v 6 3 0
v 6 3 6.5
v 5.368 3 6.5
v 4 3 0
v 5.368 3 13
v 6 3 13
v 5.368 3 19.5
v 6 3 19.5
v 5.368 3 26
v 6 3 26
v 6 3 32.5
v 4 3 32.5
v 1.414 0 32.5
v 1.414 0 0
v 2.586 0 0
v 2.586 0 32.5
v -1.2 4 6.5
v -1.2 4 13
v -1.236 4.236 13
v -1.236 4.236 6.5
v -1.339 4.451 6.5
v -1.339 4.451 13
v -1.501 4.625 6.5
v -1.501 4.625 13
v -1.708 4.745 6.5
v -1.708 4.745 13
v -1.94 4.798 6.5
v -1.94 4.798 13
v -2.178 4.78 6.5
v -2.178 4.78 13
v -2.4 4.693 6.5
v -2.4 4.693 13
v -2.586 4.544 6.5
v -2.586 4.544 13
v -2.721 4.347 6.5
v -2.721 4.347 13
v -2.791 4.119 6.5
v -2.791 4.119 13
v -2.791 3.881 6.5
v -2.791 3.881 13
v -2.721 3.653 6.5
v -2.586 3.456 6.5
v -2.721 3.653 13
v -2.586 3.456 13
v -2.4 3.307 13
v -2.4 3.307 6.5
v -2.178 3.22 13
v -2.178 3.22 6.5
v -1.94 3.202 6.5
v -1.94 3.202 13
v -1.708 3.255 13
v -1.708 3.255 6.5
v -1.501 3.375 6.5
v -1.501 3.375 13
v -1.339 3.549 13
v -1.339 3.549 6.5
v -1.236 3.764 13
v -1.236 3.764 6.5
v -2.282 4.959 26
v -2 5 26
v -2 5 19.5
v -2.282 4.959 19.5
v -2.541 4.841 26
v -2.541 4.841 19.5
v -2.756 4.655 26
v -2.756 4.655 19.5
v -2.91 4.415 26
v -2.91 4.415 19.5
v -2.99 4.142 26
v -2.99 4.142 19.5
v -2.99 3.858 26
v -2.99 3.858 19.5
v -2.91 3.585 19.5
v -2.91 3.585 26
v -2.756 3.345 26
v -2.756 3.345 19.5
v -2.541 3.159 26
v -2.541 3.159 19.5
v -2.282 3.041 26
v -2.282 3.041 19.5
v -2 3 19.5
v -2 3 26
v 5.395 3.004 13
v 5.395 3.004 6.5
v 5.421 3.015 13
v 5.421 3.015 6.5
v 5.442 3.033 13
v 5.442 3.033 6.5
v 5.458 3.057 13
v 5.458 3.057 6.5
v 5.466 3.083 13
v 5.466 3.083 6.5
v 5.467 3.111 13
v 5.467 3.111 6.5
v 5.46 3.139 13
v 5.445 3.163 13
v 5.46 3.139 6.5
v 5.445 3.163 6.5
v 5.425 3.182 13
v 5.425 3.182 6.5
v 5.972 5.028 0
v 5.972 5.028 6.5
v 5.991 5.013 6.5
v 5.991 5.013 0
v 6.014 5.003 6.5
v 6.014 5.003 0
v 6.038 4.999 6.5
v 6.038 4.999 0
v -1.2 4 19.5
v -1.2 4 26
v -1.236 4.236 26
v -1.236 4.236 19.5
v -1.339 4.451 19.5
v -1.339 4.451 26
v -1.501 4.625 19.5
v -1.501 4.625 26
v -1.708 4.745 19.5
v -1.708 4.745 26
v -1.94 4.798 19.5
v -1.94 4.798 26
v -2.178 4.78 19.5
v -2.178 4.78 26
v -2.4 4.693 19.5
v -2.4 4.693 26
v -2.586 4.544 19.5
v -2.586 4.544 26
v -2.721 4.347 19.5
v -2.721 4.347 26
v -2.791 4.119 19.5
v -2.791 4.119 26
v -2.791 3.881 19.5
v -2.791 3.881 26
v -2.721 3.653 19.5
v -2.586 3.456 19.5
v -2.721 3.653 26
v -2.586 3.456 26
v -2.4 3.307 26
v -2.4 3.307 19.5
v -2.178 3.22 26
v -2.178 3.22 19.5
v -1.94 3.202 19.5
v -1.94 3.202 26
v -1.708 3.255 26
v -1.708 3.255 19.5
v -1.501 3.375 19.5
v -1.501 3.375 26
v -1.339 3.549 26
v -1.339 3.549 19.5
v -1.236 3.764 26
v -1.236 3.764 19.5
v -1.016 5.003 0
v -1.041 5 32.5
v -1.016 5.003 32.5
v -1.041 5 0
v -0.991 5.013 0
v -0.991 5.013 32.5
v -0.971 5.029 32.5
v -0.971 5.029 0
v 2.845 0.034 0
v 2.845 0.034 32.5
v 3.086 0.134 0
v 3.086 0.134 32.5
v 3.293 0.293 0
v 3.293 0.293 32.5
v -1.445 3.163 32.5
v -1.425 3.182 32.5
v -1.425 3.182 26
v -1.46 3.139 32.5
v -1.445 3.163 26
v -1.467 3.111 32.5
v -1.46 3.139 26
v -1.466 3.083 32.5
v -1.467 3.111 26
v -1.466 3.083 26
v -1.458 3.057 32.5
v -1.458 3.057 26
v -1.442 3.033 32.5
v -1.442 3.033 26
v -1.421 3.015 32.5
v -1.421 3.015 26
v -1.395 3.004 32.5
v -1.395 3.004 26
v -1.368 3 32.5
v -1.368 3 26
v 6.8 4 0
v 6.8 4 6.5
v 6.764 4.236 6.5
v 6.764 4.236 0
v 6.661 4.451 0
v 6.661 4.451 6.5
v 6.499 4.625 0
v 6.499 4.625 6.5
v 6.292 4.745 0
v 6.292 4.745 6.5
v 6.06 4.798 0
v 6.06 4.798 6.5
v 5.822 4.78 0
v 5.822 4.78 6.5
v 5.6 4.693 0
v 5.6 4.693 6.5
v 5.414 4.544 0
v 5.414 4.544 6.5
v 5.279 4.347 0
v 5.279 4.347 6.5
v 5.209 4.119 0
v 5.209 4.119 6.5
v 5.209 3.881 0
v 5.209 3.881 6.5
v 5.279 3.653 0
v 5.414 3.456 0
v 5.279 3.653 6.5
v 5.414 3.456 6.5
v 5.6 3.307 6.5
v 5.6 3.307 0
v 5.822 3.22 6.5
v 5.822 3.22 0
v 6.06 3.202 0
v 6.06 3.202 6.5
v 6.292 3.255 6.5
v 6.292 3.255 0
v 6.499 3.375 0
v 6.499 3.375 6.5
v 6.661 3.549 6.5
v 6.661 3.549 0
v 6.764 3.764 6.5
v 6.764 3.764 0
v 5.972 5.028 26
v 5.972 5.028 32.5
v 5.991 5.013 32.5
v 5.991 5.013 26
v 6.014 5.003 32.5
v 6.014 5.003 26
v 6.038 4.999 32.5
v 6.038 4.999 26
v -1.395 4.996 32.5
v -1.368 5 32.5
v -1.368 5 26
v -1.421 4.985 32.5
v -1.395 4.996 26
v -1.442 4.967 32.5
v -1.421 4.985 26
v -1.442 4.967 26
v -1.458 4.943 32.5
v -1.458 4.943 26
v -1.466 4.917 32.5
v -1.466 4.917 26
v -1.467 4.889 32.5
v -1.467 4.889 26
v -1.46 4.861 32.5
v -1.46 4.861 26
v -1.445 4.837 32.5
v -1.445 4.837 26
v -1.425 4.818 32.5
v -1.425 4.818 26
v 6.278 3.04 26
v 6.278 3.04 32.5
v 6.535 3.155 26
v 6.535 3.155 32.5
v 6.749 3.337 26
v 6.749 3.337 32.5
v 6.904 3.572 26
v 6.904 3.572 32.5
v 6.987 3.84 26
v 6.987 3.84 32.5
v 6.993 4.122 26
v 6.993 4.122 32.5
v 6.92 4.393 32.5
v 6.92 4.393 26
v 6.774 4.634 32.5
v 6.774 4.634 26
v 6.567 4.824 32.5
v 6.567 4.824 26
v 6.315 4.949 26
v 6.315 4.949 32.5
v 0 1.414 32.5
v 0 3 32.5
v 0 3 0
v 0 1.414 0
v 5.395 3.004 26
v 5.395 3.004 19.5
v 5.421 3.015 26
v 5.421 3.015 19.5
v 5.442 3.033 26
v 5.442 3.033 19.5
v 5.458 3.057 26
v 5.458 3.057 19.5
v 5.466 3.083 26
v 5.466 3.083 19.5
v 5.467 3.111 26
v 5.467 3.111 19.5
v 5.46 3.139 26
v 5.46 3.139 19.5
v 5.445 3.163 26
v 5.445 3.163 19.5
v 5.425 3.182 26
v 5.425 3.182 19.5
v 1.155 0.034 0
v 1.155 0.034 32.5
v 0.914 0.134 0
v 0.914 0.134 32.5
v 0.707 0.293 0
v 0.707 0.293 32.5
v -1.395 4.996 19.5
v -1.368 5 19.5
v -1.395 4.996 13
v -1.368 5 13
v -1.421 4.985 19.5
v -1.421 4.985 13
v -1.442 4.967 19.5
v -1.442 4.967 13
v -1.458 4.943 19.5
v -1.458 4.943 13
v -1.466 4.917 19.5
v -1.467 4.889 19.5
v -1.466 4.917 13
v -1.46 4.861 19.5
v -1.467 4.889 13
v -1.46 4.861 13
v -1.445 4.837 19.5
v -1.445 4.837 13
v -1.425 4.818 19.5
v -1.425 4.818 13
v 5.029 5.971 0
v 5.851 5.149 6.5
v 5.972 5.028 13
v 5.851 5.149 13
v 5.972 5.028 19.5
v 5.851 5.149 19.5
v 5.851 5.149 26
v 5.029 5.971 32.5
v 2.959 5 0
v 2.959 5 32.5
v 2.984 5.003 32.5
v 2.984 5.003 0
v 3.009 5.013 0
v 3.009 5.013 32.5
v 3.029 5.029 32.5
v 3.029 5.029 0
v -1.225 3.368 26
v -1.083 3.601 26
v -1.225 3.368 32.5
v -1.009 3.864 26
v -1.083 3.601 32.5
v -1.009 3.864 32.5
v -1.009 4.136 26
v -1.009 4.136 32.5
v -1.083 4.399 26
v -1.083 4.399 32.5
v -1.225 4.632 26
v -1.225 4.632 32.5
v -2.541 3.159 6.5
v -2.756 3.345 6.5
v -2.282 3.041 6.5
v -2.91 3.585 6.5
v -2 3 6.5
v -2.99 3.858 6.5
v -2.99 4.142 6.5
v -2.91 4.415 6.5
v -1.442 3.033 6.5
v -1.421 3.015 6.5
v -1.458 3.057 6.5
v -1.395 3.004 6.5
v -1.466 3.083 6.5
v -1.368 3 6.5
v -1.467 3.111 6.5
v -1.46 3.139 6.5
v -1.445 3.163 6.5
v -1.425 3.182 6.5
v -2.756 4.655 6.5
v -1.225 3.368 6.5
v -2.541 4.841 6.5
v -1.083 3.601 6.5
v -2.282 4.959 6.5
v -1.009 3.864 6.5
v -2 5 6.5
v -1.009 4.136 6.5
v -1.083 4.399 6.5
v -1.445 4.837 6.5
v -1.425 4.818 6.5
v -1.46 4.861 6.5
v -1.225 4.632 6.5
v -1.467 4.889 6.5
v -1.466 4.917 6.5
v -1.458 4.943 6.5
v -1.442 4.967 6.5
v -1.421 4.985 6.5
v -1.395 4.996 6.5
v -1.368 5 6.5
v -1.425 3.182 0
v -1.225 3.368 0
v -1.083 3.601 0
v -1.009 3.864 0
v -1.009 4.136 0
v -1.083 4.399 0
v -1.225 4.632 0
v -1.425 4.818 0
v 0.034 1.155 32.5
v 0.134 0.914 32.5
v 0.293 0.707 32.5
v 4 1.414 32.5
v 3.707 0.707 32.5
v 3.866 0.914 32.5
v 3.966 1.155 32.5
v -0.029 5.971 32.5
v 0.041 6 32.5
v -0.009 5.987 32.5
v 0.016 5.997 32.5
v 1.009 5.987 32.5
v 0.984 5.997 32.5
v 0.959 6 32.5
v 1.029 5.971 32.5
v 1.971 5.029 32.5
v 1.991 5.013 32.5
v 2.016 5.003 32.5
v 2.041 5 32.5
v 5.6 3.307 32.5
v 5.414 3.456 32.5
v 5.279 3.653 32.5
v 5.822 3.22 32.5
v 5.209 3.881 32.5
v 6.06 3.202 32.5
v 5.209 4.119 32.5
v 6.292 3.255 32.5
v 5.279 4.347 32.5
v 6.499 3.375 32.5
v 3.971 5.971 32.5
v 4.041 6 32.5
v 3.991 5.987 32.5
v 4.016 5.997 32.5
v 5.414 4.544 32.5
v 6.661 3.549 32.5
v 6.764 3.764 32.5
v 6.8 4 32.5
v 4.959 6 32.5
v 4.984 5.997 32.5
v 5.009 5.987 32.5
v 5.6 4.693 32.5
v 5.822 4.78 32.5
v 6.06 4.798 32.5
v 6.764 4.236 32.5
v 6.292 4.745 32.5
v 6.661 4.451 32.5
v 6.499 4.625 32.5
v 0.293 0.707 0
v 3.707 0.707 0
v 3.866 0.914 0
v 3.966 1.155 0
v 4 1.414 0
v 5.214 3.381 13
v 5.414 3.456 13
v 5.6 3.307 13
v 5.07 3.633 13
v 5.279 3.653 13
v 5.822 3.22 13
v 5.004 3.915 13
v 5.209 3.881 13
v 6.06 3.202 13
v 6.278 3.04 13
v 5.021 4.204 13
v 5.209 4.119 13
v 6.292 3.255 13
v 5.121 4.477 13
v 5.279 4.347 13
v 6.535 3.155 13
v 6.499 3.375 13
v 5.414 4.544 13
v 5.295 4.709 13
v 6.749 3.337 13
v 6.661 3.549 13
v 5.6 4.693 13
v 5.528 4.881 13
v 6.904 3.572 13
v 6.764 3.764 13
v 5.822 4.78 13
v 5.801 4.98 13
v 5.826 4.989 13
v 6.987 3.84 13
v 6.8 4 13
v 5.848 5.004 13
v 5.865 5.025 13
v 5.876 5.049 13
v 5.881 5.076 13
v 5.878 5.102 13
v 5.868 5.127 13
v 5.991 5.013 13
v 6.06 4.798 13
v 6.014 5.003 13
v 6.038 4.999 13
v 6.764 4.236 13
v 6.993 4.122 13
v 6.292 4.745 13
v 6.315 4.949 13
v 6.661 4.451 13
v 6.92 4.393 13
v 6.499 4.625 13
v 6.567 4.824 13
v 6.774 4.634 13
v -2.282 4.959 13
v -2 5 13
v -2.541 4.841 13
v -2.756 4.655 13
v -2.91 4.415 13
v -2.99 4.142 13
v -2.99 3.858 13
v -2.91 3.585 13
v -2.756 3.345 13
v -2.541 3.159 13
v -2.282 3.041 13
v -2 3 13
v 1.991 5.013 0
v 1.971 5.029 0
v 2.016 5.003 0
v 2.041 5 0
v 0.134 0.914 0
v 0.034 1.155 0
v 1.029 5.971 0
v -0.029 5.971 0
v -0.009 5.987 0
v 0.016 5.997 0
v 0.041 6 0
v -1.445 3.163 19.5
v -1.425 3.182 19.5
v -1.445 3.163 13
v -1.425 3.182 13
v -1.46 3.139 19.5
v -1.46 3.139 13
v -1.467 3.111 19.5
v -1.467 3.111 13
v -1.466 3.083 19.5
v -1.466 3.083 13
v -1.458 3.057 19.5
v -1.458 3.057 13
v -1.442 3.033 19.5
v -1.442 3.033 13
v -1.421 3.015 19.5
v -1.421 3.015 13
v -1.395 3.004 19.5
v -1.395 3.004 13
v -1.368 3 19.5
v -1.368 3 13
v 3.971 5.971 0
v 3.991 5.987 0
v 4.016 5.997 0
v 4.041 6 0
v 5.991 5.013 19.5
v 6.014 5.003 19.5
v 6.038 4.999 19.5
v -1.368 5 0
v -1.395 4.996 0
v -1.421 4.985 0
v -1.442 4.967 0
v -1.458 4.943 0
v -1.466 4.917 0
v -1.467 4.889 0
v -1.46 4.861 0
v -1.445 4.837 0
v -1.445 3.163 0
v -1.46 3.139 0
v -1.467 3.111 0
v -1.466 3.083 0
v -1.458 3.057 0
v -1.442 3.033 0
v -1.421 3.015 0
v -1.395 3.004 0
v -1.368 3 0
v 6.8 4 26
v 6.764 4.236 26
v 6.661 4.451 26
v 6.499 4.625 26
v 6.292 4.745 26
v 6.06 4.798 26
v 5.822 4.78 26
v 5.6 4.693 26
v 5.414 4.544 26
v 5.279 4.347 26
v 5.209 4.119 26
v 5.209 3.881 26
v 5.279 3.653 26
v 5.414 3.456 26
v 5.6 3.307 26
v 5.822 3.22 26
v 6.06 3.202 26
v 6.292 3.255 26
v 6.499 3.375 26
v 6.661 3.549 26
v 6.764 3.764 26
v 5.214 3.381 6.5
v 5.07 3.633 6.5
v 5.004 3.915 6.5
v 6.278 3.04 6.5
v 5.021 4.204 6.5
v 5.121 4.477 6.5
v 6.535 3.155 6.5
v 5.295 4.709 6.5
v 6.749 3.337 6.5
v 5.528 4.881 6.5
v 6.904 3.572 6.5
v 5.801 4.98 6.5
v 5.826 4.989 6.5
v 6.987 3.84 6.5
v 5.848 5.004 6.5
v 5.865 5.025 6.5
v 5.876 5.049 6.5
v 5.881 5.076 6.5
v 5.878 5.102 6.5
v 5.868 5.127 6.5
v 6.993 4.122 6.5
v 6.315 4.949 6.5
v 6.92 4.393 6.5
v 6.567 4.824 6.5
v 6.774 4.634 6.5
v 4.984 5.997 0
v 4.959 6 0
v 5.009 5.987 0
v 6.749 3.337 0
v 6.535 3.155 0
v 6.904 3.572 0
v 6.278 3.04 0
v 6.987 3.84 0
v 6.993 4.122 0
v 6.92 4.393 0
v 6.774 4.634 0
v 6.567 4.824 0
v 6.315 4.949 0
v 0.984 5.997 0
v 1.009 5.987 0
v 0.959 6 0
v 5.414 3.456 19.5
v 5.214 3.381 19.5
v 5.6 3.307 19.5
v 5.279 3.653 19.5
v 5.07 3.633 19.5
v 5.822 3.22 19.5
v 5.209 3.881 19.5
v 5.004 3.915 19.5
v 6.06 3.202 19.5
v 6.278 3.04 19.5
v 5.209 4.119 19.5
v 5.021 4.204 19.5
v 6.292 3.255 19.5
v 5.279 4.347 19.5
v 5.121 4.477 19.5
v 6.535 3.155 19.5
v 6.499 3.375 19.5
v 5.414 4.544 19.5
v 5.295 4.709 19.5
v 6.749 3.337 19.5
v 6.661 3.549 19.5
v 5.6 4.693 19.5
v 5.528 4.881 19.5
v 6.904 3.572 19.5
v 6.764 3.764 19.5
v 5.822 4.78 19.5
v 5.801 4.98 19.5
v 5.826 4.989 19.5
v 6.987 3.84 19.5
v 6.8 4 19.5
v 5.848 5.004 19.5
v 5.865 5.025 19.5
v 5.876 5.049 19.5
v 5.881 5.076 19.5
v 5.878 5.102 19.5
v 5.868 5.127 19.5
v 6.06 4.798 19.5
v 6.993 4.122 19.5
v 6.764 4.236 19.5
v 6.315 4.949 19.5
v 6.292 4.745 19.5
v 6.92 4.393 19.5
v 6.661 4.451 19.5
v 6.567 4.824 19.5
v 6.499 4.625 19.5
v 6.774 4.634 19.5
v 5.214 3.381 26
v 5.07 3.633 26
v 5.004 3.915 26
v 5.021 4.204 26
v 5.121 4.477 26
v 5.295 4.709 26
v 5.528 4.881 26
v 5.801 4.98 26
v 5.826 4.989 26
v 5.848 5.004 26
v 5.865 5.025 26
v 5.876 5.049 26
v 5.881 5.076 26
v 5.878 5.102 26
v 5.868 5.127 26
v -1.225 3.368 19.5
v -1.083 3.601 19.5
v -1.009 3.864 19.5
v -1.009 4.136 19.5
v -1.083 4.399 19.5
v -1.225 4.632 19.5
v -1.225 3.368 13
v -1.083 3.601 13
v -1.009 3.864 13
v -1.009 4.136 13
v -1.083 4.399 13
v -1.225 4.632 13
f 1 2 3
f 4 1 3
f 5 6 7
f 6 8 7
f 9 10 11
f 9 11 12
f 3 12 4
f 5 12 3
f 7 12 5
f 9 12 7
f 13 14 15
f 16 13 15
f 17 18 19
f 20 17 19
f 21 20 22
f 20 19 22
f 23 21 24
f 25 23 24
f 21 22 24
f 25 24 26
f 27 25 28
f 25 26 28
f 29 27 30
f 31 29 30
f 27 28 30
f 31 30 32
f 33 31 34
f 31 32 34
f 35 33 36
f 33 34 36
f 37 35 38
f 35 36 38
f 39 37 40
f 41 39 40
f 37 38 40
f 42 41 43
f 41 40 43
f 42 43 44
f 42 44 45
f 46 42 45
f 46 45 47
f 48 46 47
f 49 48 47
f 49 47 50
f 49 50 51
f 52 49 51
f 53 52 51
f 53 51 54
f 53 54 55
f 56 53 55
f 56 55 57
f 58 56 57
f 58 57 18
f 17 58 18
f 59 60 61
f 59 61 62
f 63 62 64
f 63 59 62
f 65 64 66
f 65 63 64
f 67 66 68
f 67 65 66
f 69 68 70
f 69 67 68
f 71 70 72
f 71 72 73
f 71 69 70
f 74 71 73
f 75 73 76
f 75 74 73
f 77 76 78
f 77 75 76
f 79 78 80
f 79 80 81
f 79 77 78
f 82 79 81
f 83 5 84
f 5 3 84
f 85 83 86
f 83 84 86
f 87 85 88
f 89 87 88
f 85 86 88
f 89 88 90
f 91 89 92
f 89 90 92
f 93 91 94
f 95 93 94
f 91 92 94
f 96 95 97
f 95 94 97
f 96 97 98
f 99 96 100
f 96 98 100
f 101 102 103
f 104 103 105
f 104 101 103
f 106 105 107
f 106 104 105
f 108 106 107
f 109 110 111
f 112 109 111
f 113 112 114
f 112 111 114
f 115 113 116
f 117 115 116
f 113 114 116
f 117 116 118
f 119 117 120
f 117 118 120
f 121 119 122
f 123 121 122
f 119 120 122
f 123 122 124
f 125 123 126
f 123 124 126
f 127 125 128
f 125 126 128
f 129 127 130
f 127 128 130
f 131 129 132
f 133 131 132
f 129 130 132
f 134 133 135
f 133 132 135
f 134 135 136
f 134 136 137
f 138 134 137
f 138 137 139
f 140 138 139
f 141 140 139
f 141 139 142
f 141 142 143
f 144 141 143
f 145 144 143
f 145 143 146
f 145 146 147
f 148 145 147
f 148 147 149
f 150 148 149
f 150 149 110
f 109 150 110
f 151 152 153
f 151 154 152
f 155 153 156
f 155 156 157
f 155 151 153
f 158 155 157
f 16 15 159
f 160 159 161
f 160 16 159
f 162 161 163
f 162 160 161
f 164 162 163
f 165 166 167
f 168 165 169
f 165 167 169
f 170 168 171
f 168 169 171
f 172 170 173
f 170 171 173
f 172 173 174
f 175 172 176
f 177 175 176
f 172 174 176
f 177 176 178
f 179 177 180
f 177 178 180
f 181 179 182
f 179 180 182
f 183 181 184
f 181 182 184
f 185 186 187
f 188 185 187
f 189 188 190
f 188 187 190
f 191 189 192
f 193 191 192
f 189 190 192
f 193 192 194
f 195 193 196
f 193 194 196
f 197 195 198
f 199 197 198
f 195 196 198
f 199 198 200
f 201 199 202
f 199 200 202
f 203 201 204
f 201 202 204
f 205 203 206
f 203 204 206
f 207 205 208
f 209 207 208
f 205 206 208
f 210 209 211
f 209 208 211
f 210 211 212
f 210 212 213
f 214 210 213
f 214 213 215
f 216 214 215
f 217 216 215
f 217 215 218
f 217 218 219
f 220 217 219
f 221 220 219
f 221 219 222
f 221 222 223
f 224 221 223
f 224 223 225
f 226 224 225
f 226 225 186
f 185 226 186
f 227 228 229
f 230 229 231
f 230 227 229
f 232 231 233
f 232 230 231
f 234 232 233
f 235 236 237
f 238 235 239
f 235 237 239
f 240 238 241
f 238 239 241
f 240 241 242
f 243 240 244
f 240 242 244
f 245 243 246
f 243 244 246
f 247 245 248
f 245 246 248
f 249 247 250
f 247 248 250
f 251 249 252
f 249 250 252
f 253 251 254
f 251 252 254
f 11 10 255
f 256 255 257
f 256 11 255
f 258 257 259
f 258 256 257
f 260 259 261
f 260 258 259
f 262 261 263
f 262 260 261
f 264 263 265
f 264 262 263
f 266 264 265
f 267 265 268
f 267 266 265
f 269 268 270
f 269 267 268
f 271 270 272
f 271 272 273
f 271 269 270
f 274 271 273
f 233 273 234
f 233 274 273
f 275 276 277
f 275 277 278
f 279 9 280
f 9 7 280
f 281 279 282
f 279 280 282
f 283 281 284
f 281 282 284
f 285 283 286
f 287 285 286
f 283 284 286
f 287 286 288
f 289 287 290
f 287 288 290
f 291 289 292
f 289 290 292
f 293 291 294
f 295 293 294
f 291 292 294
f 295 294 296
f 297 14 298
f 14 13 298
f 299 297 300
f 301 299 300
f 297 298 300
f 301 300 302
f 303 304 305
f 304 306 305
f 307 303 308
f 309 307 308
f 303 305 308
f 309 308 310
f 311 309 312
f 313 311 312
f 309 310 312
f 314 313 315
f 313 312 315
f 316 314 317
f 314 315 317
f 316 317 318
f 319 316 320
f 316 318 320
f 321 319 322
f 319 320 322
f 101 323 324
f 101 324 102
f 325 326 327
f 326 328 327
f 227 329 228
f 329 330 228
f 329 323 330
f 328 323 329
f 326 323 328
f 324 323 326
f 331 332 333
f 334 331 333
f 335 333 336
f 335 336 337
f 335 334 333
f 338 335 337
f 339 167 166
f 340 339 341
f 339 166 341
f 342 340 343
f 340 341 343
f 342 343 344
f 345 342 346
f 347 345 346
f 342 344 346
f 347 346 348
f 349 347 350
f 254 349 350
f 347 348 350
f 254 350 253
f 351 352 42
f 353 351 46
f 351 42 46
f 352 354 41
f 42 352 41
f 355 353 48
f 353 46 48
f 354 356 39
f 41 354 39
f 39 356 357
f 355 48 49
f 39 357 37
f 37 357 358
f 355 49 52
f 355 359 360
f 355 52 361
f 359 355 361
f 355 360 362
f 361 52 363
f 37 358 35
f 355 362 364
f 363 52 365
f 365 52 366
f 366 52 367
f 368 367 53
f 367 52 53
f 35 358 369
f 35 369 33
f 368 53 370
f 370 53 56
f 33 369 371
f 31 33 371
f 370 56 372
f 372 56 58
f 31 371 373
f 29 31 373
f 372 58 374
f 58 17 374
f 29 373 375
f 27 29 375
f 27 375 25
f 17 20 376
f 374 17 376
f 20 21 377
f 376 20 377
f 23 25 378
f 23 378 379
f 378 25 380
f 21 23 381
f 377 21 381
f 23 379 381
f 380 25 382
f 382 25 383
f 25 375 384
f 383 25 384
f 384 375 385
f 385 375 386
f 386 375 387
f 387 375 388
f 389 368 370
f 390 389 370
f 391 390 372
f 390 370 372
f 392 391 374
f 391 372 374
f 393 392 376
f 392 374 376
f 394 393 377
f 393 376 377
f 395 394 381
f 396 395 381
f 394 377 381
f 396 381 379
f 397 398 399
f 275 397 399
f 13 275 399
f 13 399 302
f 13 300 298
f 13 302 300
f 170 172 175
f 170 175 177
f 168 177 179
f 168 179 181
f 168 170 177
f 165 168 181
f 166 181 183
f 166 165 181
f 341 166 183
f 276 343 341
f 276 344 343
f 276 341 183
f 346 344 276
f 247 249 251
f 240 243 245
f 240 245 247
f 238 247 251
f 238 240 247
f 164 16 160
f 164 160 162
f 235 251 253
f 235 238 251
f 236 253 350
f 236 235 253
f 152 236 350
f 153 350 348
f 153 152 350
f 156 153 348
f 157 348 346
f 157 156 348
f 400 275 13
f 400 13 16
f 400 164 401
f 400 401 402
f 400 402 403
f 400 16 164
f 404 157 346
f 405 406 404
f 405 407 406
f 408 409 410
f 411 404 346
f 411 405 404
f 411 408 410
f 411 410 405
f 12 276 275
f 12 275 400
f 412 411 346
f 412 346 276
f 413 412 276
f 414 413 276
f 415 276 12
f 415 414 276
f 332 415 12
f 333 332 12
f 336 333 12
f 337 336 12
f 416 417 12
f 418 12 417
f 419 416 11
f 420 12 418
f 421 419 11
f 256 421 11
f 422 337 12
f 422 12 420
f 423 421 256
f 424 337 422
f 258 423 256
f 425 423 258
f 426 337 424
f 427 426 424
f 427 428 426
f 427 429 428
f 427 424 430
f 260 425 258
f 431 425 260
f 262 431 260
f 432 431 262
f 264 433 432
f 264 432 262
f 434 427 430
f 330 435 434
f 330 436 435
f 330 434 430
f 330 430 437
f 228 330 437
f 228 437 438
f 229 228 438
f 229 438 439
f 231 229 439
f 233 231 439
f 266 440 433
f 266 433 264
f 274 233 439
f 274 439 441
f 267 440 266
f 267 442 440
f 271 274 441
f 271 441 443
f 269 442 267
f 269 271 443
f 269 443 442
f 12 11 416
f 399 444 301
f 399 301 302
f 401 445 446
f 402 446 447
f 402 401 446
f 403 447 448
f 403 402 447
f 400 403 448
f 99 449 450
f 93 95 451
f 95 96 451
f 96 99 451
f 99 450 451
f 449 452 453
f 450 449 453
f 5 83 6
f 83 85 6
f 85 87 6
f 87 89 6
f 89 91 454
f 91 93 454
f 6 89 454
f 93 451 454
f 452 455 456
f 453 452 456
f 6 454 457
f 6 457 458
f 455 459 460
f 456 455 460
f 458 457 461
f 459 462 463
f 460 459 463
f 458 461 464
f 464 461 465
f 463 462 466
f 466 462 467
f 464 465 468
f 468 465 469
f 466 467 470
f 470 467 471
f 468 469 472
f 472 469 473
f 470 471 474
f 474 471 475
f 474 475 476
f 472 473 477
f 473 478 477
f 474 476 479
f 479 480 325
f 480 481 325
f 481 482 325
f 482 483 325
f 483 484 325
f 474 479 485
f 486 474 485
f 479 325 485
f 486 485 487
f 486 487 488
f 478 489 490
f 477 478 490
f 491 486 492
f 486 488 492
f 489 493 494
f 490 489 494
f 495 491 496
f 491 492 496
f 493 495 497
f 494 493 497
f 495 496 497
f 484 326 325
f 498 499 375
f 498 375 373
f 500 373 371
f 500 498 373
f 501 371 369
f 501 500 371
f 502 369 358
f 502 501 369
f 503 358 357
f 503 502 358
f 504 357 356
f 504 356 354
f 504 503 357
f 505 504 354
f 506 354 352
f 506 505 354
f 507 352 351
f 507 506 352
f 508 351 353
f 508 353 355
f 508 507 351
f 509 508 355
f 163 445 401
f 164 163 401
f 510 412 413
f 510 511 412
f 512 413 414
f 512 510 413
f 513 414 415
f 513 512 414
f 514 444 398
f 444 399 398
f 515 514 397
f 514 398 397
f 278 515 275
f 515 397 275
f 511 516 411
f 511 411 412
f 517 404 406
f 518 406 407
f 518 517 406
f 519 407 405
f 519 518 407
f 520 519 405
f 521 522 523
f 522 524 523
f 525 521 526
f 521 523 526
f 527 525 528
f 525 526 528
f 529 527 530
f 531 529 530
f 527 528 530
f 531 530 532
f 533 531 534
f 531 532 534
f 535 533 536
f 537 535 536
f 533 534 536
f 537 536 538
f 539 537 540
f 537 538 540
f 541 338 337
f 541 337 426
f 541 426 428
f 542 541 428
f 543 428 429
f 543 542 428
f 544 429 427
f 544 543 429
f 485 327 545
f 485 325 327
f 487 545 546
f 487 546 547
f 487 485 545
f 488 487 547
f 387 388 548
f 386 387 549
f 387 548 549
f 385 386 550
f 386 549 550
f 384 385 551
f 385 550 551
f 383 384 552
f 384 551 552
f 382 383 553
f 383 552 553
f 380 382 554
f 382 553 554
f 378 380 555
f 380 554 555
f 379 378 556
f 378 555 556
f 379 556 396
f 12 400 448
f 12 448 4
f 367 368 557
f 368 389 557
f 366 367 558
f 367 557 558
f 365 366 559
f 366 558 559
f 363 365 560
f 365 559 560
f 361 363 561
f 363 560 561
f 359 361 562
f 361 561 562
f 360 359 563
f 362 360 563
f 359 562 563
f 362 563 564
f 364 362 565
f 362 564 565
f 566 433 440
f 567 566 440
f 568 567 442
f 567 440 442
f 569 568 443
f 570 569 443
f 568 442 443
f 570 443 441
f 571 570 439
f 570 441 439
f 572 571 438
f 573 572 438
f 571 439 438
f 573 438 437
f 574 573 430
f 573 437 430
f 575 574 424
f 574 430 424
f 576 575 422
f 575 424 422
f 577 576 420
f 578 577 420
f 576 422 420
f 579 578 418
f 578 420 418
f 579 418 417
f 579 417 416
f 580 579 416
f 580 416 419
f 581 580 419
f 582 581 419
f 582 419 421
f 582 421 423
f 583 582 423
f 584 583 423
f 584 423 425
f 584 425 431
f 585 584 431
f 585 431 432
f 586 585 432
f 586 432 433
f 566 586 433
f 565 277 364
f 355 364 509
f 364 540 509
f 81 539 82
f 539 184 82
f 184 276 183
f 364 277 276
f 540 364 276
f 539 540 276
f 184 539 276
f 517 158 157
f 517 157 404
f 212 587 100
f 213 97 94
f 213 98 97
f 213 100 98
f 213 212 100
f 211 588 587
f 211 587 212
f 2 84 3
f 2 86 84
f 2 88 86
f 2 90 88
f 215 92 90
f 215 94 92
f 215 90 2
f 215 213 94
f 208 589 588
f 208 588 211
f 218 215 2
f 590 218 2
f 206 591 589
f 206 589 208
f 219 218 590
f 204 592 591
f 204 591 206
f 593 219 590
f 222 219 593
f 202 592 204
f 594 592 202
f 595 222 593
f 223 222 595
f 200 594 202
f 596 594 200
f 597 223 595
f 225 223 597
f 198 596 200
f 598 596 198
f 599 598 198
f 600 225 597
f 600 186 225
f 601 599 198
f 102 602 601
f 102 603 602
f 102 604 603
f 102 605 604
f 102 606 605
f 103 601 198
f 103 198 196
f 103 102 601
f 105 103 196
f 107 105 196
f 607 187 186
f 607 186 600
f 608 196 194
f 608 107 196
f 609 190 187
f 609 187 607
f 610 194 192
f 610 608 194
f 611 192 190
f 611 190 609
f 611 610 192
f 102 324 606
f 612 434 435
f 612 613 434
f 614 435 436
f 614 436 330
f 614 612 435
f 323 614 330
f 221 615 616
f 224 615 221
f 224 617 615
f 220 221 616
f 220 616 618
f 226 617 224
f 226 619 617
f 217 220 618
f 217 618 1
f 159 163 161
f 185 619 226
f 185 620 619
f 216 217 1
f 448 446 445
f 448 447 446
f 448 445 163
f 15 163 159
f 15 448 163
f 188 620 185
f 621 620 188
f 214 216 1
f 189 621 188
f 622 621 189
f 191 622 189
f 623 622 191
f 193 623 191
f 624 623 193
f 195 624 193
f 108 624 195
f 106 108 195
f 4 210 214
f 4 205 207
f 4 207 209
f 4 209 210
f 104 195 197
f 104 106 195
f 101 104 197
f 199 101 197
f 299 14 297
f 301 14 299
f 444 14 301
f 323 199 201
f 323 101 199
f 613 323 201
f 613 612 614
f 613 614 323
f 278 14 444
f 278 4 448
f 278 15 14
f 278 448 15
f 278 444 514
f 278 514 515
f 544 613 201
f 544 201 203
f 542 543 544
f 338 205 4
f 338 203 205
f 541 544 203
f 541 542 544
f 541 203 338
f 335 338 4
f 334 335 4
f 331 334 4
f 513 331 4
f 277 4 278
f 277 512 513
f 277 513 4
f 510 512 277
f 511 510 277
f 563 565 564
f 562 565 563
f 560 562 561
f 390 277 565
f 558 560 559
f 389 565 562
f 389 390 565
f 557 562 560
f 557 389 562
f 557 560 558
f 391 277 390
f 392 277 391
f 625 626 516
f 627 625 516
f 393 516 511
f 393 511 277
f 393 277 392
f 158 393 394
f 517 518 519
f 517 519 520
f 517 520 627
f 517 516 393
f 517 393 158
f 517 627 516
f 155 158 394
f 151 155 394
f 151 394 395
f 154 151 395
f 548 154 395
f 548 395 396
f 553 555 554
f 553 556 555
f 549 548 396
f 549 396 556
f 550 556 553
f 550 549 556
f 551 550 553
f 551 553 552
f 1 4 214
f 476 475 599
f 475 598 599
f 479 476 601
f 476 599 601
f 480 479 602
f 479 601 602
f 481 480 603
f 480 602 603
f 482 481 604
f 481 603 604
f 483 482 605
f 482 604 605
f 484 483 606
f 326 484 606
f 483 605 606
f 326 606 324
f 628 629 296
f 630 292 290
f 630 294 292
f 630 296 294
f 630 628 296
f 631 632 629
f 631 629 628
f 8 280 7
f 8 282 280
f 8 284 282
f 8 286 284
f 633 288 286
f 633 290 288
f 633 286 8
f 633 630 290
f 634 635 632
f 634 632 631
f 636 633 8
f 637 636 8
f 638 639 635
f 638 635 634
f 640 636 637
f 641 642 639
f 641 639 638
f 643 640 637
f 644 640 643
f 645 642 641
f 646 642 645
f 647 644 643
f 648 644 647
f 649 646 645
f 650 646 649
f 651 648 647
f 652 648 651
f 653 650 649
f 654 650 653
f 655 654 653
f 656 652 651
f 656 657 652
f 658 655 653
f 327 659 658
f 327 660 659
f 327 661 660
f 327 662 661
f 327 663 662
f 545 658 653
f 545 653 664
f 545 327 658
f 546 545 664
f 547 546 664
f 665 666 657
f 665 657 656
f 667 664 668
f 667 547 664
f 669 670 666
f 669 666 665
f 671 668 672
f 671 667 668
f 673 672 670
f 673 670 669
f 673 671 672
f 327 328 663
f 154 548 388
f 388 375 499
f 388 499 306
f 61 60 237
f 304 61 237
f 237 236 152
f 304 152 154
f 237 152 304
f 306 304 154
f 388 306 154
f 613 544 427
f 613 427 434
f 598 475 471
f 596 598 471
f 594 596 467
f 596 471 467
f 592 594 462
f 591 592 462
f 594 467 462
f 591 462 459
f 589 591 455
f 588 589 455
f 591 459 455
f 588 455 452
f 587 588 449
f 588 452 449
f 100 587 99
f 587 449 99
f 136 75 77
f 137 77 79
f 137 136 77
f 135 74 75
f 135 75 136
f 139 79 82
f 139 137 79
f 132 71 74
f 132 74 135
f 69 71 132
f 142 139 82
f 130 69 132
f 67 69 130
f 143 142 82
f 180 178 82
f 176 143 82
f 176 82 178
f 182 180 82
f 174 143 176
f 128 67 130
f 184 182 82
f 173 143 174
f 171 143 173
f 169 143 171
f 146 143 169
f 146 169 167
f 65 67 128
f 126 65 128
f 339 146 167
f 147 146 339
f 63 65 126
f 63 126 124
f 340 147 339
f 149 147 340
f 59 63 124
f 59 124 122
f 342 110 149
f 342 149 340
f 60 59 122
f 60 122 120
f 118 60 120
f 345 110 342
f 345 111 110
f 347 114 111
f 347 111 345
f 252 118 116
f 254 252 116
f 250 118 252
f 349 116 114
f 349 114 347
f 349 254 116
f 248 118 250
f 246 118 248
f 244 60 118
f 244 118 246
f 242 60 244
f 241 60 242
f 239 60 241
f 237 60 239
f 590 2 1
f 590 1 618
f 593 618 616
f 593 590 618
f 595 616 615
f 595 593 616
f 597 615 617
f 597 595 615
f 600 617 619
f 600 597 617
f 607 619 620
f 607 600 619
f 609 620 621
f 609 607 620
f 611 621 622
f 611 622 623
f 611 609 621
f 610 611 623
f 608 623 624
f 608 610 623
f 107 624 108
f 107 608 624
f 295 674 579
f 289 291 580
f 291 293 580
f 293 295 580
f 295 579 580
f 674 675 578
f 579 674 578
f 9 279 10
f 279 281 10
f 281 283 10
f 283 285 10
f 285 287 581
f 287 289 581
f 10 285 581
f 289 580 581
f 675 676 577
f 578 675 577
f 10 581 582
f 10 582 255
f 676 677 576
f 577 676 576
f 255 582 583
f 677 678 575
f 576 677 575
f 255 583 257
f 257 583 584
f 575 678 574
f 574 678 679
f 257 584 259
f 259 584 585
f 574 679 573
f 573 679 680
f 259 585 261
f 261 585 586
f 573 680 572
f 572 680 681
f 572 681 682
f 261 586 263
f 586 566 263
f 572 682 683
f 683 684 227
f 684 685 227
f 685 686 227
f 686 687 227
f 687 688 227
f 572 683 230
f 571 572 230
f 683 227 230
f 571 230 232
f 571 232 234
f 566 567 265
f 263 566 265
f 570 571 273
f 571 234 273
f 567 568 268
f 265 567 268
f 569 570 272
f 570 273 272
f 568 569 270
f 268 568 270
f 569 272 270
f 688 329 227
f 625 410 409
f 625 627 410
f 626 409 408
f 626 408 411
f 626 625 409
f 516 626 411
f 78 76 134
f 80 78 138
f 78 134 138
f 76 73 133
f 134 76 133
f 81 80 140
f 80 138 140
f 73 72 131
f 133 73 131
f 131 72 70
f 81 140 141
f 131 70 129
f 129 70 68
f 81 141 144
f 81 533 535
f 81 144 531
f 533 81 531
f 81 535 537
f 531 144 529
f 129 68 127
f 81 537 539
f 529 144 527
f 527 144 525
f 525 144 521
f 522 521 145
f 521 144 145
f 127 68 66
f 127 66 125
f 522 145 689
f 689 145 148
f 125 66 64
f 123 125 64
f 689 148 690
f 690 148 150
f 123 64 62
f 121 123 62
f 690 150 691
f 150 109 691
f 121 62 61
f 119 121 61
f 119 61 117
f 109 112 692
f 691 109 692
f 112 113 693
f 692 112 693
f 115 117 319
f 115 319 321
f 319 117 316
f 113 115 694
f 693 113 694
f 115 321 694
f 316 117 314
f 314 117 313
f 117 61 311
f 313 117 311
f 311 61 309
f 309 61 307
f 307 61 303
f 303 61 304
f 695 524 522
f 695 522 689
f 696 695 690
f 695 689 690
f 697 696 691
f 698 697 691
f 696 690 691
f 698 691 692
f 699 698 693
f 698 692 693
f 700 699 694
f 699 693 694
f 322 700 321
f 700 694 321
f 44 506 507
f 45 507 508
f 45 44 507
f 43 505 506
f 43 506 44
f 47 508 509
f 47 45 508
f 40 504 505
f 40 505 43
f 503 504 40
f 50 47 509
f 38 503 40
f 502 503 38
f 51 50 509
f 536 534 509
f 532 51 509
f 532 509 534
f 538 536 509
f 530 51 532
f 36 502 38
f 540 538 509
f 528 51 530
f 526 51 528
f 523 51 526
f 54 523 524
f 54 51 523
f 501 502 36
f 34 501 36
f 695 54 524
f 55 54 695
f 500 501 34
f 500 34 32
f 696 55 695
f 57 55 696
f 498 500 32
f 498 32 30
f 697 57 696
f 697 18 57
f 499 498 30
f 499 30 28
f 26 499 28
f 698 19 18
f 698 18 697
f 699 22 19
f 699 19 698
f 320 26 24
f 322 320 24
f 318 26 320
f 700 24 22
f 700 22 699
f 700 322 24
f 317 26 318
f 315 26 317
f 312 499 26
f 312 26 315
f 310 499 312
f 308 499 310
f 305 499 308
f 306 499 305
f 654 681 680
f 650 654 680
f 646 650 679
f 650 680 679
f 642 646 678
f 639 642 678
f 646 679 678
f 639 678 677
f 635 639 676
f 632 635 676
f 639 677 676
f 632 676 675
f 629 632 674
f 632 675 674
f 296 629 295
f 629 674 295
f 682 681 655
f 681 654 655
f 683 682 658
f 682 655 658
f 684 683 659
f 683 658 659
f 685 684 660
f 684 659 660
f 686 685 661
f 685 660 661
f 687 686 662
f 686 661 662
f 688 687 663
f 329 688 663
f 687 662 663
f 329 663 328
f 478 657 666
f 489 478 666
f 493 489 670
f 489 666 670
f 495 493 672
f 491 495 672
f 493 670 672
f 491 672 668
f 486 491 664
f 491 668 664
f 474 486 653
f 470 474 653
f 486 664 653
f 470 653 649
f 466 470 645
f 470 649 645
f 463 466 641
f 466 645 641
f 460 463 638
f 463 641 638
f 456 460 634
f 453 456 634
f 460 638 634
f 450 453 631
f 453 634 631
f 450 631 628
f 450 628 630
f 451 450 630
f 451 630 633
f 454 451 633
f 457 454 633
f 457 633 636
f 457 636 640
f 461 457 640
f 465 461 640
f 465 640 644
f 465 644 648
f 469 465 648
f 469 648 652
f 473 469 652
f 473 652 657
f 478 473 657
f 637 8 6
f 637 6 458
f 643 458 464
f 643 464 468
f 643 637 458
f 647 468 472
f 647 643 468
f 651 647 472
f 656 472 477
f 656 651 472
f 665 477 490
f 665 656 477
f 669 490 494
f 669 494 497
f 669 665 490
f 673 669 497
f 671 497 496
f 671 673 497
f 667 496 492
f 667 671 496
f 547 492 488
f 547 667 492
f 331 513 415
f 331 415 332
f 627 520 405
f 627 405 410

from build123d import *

# Parameters (mm, degrees)
BOSS_EXTRUDE1_DEPTH  = 32.5
CHAMFER1_SIZE        = 1
FILLET1_R            = 1
BOSS_EXTRUDE7_DEPTH  = 32.5
SKETCH3_R            = 0.9999999999999979
BOSS_EXTRUDE9_DEPTH  = 6.5
LPATTERN2_COUNT      = 3
LPATTERN2_PITCH      = 13
SKETCH5_R            = 1.0000000000000002
BOSS_EXTRUDE10_DEPTH = 6.5
LPATTERN3_COUNT      = 2
LPATTERN3_PITCH      = 13
FILLET2_R            = 0.1
M2_TAPPED_HOLE1_D    = 1.6
FILLET3_R            = 0.1


with BuildPart() as part:
    # Sketch1 → Boss-Extrude1 (new body)
    with BuildSketch(Plane.XY):
        Polygon((0, 0), (4, 0), (3.9999999999999982, 4), (-1.73e-15, 4), align=None)
    extrude(amount=BOSS_EXTRUDE1_DEPTH)

    # Chamfer1
    chamfer1_edges = [part.edges().sort_by_distance(p)[0] for p in [
        (4, 0, 16.25),
        (0, 0, 16.25),
    ]]
    chamfer(chamfer1_edges, length=CHAMFER1_SIZE)

    # Fillet1
    fillet1_edges = [part.edges().sort_by_distance(p)[0] for p in [
        (3, 0, 16.25),
        (1, 0, 16.25),
        (-4.3e-16, 1, 16.25),
        (3.9999999999999996, 1, 16.25),
    ]]
    fillet(fillet1_edges, radius=FILLET1_R)

    # Sketch2 → Boss-Extrude7 (add)
    with BuildSketch(Plane.XY.offset(32.5)):
        with BuildLine():
            Line((-1.73e-15, 3), (-2, 2.9999999999999996))
            ThreePointArc((-2, 2.9999999999999996), (-1.0000000000000009, 4), (-2, 4.999999999999999))
            Line((-2, 4.999999999999999), (-1.0000000000000009, 4.999999999999999))
            Line((-1.0000000000000009, 4.999999999999999), (-1.74e-15, 6.000000000000002))
            Line((-1.74e-15, 6.000000000000002), (1, 6))
            Line((1, 6), (2.000000000000004, 4.999999999999999))
            Line((2.000000000000004, 4.999999999999999), (3.000000000000002, 4.999999999999997))
            Line((3.000000000000002, 4.999999999999997), (4.000000000000002, 6))
            Line((4.000000000000002, 6), (5.0000000000000036, 5.999999999999998))
            Line((5.0000000000000036, 5.999999999999998), (6.000000000000008, 4.999999999999997))
            ThreePointArc((6.000000000000008, 4.999999999999997), (5.000000000000009, 3.9999999999999982), (6.000000000000008, 3))
            Line((6.000000000000008, 3), (-1.73e-15, 3))
        make_face()
    extrude(amount=-BOSS_EXTRUDE7_DEPTH)

    # Sketch3 → Boss-Extrude9 (add)
    with BuildSketch(Plane.XY.offset(32.5)):
        with Locations((6.000000000000008, 3.9999999999999982)):
            Circle(SKETCH3_R)
    boss_extrude9 = extrude(amount=-BOSS_EXTRUDE9_DEPTH)

    # LPattern2: Boss-Extrude9 ×3
    with Locations(*[(0, 0, -i * LPATTERN2_PITCH) for i in range(1, LPATTERN2_COUNT)]):
        add(boss_extrude9)

    # Sketch5 → Boss-Extrude10 (add)
    with BuildSketch(Plane.XY.offset(26.000000000000004)):
        with Locations((-2, 4)):
            Circle(SKETCH5_R)
    boss_extrude10 = extrude(amount=-BOSS_EXTRUDE10_DEPTH)

    # LPattern3: Boss-Extrude10 ×2
    with Locations(*[(0, 0, -i * LPATTERN3_PITCH) for i in range(1, LPATTERN3_COUNT)]):
        add(boss_extrude10)

    # Fillet2
    fillet2_edges = [part.edges().sort_by_distance(p)[0] for p in [
        (6.000000000000008, 4.999999999999998, 9.75),
        (6.000000000000008, 3, 9.75),
        (-2, 4.999999999999999, 29.25),
        (-2, 2.9999999999999996, 29.25),
        (-2, 4.999999999999999, 16.250000000000004),
        (-2, 2.9999999999999996, 16.250000000000004),
        (-2, 2.9999999999999996, 3.25),
        (-2, 4.999999999999999, 3.25),
        (6.000000000000008, 4.999999999999998, 22.75),
        (6.000000000000008, 3, 22.75),
    ]]
    fillet(fillet2_edges, radius=FILLET2_R)

    # M2 Tapped Hole1 (through all)
    with Locations(Plane(origin=(0, 0, 0), x_dir=(-1, 0, 0), z_dir=(0, 0, -1))):
        with Locations((-6, 4), (2, 4)):
            Hole(M2_TAPPED_HOLE1_D / 2)

    # Fillet3
    fillet3_edges = [part.edges().sort_by_distance(p)[0] for p in [
        (6.000000000000008, 4.999999999999998, 3.25),
        (-1.0000000000000009, 4.999999999999999, 16.25),
        (-1.74e-15, 6.000000000000002, 16.25),
        (1, 6, 16.25),
        (2.000000000000004, 4.999999999999999, 16.25),
        (3.000000000000002, 4.999999999999997, 16.25),
        (4.000000000000002, 6, 16.25),
        (5.0000000000000036, 5.999999999999998, 16.25),
        (6.000000000000008, 4.999999999999998, 29.25),
        (6.000000000000008, 4.999999999999998, 16.25),
    ]]
    fillet(fillet3_edges, radius=FILLET3_R)


solid = part.part
